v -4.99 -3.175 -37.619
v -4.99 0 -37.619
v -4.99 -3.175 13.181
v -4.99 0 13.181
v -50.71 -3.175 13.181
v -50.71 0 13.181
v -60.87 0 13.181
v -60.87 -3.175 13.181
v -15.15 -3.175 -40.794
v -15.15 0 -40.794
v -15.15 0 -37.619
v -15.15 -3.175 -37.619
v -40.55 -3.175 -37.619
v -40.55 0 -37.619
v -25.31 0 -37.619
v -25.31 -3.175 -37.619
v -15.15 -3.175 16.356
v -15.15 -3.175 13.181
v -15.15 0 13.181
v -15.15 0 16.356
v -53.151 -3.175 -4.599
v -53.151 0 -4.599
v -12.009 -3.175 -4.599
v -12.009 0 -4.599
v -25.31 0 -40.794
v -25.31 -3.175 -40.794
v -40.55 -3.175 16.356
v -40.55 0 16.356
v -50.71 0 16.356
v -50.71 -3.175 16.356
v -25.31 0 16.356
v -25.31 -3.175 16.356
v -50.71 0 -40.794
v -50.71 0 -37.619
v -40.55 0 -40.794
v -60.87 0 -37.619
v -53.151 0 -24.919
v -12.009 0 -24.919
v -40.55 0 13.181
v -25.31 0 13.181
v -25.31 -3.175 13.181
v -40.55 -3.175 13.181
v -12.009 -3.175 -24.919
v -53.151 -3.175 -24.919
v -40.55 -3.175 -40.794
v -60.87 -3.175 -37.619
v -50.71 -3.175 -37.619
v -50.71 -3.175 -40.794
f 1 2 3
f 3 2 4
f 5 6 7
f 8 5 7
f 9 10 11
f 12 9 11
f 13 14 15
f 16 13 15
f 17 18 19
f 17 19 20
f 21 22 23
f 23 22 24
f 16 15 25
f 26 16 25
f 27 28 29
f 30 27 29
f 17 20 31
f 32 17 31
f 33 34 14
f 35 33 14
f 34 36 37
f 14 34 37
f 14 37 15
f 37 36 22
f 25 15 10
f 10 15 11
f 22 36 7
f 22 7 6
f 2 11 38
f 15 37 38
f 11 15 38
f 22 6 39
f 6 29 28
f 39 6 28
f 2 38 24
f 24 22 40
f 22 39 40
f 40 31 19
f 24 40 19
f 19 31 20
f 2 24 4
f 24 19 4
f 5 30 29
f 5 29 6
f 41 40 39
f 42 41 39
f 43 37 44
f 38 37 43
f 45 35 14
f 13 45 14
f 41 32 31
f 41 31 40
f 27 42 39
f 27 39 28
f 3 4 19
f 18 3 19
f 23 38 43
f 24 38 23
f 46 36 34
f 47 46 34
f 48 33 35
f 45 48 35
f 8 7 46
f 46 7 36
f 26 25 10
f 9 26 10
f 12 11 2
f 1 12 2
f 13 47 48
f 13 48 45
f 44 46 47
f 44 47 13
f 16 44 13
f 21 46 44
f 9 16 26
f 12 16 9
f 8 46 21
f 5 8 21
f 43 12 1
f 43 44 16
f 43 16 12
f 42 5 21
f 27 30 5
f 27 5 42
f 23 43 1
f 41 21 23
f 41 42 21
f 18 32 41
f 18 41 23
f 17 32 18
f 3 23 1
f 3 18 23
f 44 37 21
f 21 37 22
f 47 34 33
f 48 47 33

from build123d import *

# Parameters (mm, degrees)
F0_W     = 41.142106
F0_H     = 20.32
F1_DEPTH = 3.175


with BuildPart() as f1:
    # F0 (on Front) → F1 (new body)
    with BuildSketch(Plane.XZ):
        Polygon((-50.709821, 13.180559), (-60.869821, 13.180559), (-60.869821, -37.619441), (-50.709821, -37.619441), (-50.709821, -40.794441), (-40.549821, -40.794441), (-40.549821, -37.619441), (-25.309821, -37.619441), (-25.309821, -40.794441), (-15.149821, -40.794441), (-15.149821, -37.619441), (-4.989821, -37.619441), (-4.989821, 13.180559), (-15.149821, 13.180559), (-15.149821, 16.355559), (-25.309821, 16.355559), (-25.309821, 13.180559), (-40.549821, 13.180559), (-40.549821, 16.355559), (-50.709821, 16.355559), align=None)
        with Locations((-32.580219, -14.759441)):
            Rectangle(F0_W, F0_H, mode=Mode.SUBTRACT)
    extrude(amount=F1_DEPTH)


solid = f1.part
